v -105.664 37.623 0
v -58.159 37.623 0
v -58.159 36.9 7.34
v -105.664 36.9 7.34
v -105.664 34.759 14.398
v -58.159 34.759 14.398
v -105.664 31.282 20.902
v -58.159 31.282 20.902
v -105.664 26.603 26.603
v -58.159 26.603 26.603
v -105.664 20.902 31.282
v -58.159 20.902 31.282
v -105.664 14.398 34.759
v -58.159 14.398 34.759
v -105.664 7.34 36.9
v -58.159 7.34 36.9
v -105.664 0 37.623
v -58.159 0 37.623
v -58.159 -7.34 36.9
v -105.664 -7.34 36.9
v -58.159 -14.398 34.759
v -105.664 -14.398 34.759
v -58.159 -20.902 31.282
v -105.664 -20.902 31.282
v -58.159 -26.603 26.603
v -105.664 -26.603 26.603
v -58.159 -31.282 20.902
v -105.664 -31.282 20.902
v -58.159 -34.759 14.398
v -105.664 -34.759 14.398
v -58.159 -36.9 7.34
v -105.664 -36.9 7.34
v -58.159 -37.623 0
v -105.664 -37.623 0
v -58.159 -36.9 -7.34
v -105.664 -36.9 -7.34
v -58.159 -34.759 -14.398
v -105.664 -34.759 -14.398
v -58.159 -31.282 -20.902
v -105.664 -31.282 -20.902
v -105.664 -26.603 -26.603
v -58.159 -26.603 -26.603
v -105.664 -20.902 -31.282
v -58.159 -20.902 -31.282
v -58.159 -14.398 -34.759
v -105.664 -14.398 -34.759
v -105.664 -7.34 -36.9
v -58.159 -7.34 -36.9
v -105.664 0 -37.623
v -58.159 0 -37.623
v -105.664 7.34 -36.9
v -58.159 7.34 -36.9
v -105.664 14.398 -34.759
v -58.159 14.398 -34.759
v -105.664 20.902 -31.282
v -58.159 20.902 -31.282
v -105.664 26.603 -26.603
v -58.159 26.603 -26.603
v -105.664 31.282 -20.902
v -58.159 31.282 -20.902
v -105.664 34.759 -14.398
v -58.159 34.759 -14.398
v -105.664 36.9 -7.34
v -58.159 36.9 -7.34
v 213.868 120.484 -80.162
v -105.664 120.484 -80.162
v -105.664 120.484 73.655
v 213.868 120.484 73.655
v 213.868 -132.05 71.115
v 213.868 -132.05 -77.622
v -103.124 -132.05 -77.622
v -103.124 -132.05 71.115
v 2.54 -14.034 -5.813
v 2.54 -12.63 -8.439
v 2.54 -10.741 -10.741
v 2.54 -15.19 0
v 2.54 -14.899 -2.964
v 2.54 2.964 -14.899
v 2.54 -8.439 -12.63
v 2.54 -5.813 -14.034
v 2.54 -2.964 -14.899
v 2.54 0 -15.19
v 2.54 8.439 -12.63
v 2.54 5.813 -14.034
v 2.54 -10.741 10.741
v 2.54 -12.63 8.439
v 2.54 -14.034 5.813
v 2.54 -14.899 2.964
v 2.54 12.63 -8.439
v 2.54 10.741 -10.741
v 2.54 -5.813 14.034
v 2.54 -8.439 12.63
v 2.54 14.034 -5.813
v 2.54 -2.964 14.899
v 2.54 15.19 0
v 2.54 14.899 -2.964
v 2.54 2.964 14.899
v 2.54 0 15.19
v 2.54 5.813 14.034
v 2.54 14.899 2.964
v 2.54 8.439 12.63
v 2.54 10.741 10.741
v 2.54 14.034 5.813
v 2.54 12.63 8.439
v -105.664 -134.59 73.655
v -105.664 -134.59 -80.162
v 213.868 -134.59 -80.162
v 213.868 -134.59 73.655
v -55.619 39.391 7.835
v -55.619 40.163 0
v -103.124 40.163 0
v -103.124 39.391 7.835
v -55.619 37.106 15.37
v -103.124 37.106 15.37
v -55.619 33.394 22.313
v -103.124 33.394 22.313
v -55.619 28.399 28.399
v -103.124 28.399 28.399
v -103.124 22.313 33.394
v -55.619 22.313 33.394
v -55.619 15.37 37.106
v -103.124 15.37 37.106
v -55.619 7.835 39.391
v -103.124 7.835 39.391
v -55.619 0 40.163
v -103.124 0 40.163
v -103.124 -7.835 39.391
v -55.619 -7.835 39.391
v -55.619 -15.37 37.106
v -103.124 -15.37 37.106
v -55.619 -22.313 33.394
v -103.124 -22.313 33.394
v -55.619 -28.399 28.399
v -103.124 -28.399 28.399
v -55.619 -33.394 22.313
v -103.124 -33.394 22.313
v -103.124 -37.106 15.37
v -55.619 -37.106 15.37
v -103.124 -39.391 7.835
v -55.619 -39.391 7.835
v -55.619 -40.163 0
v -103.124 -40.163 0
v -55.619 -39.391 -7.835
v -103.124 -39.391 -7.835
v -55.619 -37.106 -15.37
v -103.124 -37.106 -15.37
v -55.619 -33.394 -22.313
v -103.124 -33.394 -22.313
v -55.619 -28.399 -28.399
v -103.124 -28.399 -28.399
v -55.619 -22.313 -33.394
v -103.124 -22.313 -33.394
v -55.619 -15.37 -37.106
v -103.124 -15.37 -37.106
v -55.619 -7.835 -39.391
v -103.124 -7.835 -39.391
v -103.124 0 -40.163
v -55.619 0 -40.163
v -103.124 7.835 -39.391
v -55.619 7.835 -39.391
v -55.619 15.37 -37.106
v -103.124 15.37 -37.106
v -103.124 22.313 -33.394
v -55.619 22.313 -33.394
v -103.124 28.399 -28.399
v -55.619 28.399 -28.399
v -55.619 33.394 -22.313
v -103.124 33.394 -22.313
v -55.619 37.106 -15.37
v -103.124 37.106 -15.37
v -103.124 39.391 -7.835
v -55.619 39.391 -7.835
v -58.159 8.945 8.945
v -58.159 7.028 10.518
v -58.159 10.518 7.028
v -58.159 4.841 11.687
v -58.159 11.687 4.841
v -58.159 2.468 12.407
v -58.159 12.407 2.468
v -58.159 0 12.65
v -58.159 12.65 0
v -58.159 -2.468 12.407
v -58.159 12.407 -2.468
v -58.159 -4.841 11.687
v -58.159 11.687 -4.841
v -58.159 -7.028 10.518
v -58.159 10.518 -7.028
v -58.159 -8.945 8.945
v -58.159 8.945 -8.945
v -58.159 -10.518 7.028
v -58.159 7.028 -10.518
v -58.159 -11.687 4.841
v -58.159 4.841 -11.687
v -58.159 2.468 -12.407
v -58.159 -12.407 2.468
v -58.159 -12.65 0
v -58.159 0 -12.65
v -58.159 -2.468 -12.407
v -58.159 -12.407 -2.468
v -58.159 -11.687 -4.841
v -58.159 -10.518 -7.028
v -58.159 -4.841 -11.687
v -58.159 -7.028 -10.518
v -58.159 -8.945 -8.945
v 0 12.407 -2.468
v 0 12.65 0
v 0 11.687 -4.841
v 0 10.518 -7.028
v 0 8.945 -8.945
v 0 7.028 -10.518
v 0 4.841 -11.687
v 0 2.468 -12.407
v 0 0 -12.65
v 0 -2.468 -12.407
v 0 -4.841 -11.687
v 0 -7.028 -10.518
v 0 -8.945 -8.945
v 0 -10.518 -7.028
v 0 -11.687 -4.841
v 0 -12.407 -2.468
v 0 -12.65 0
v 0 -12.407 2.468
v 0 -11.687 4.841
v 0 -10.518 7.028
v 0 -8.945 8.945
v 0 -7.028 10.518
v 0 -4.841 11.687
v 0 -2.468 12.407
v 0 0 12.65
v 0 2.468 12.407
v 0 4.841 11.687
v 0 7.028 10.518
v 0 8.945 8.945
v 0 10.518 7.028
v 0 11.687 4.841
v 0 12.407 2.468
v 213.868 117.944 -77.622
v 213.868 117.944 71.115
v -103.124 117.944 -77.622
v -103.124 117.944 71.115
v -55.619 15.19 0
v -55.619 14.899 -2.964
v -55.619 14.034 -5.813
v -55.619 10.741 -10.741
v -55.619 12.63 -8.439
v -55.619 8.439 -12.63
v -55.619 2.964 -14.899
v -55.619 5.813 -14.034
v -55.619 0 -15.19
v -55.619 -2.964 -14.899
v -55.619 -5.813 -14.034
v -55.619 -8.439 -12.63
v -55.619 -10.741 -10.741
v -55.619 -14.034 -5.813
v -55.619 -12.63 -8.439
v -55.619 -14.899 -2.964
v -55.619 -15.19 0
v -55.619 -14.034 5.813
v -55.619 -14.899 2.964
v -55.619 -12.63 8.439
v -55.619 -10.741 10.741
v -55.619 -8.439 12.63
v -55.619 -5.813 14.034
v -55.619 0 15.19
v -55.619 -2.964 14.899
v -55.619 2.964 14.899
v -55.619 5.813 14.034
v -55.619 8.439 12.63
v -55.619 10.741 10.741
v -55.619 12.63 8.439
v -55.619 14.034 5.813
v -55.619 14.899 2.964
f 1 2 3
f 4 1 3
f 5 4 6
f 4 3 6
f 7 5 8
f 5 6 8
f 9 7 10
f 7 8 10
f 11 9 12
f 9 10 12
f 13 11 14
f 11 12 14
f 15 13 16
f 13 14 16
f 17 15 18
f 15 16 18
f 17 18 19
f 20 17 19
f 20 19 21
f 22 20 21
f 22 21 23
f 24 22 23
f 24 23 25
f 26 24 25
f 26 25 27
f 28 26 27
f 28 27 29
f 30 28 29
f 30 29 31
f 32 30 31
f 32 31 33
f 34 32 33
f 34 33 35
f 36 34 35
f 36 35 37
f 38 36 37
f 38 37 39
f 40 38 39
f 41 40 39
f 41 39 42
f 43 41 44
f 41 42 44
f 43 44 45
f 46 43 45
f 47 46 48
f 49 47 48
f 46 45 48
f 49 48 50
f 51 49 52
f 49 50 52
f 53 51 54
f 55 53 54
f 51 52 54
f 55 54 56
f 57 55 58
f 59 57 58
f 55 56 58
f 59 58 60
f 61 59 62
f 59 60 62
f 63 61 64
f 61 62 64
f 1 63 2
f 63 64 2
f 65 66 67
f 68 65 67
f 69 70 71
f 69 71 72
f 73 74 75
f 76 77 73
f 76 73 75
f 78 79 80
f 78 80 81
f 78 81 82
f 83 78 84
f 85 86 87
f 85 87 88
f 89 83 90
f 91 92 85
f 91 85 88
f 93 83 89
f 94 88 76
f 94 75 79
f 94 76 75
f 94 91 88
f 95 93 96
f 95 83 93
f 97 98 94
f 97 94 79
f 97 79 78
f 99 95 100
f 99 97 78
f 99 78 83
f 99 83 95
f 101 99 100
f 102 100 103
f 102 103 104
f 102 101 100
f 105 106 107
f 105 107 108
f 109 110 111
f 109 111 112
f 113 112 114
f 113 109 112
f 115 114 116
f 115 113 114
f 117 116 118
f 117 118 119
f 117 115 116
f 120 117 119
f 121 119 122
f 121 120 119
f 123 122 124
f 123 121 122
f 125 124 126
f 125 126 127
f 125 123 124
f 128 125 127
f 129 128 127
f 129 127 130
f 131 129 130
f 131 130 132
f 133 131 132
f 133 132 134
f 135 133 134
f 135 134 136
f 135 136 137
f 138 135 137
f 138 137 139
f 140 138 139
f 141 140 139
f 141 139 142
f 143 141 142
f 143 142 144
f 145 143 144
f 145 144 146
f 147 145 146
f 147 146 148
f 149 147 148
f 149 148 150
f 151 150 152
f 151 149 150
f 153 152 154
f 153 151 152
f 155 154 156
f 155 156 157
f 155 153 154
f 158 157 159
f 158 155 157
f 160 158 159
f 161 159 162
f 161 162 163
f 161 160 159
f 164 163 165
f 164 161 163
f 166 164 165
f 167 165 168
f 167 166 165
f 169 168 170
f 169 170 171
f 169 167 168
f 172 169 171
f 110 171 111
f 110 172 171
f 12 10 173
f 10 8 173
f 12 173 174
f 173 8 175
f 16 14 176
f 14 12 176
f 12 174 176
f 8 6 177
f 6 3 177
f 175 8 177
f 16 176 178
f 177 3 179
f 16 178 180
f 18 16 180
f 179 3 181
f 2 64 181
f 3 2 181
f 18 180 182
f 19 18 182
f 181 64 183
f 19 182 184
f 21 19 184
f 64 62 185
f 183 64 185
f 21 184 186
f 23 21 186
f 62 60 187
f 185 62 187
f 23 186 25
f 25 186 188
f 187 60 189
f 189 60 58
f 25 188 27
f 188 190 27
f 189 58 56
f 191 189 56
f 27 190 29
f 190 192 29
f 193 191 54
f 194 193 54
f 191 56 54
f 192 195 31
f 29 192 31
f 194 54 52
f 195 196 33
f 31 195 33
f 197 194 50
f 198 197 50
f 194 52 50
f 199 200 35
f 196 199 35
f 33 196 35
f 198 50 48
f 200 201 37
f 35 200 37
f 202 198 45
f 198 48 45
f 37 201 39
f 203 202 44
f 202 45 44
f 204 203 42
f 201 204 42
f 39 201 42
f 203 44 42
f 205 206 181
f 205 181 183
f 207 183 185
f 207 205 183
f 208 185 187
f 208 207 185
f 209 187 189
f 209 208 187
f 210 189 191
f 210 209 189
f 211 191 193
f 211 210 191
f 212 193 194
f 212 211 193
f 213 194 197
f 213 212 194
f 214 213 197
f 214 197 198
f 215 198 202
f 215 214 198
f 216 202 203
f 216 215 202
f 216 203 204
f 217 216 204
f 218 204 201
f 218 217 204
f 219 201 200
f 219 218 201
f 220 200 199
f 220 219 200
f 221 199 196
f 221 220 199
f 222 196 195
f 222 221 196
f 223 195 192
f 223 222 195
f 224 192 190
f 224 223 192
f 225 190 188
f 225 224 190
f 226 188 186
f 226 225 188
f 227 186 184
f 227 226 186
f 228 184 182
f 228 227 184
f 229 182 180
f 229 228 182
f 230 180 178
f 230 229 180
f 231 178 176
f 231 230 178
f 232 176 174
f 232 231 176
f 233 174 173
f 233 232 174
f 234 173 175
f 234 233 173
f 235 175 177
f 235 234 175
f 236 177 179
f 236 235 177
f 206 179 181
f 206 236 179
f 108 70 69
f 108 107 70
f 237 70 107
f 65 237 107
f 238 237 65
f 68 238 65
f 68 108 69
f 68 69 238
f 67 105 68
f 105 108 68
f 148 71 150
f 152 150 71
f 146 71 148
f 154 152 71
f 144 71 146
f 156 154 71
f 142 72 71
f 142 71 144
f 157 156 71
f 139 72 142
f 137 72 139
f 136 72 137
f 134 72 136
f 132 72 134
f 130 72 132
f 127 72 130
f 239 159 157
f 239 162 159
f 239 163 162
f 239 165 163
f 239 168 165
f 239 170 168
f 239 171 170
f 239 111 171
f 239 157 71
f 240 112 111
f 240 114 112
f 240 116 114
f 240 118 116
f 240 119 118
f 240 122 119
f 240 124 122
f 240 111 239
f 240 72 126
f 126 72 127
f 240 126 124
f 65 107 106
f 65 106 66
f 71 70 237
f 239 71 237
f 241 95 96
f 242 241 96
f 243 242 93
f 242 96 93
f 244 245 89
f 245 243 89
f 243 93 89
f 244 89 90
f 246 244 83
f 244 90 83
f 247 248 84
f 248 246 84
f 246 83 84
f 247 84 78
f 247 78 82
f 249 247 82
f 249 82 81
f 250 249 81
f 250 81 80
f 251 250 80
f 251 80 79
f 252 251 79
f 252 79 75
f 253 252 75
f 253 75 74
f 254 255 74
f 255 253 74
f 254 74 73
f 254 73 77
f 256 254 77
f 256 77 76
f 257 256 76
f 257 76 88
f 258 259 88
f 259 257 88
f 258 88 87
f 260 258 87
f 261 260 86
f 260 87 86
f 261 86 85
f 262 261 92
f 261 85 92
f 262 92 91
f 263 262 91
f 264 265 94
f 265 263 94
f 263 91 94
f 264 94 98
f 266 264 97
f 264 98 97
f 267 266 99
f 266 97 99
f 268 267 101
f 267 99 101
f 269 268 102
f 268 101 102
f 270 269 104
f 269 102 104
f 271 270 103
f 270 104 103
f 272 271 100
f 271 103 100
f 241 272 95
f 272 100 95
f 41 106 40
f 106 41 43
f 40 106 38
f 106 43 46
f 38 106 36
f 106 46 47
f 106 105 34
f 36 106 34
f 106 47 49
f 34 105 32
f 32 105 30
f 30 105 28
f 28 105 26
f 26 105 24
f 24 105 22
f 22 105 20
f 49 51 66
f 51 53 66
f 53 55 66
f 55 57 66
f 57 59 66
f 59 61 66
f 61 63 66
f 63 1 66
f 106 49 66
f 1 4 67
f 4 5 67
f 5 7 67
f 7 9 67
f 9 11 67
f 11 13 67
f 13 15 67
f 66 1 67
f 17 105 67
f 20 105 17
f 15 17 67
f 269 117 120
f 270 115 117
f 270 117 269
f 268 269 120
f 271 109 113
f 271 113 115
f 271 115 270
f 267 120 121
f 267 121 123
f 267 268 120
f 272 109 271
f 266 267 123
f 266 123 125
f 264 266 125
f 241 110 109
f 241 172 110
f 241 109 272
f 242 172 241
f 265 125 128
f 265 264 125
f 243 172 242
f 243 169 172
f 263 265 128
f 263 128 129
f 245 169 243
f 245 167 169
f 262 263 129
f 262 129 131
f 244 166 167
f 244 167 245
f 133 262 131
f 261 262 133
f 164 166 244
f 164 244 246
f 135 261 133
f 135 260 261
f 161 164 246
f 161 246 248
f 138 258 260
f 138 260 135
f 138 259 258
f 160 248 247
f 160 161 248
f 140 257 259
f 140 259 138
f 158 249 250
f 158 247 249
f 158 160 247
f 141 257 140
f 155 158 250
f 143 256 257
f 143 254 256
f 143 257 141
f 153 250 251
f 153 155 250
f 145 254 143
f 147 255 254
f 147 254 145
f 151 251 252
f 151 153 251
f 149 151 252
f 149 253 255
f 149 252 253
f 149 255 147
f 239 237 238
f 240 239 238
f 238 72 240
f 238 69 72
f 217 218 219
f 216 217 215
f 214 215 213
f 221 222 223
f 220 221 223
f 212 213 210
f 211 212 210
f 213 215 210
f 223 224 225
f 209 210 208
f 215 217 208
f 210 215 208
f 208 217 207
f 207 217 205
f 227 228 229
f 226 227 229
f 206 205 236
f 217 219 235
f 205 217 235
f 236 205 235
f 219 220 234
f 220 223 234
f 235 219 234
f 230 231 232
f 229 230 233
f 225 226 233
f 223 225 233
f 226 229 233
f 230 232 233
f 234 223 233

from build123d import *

# Parameters (mm, degrees)
F0_W     = 118.9471073449
F0_H     = 24.972319603
F2_W     = 255.0741881132
F2_H     = 153.8173779845
F3_DEPTH = 213.868
F4_DEPTH = 105.664
F5_T     = -2.54


with BuildPart() as f1:
    # F0 (on Top) → F1 (revolve)
    with BuildSketch(Plane.XY):
        with Locations((1.3143327087, 25.1366123557)):
            Rectangle(F0_W, F0_H)
    revolve(axis=Axis((7.0028230548, 0, 0), (-1, 0, 0)))

    # F2 (on Right) → F3 (join)
    with BuildSketch(Plane.YZ):
        with Locations((-7.0527419448, -3.2536052167)):
            Rectangle(F2_W, F2_H)
    extrude(amount=F3_DEPTH)

    # F4 (add): a face of the model
    f4_faces = [f1.faces().sort_by_distance(p)[0] for p in [
        (0, 117.50571774, -3.2536052167),
    ]]
    extrude(f4_faces, amount=F4_DEPTH)

    # F5
    f5_openings = [f1.faces().sort_by_distance(p)[0] for p in [
        (213.868, -7.052742, -3.253605),
    ]]
    offset(amount=F5_T, openings=f5_openings, kind=Kind.INTERSECTION)


solid = f1.part
